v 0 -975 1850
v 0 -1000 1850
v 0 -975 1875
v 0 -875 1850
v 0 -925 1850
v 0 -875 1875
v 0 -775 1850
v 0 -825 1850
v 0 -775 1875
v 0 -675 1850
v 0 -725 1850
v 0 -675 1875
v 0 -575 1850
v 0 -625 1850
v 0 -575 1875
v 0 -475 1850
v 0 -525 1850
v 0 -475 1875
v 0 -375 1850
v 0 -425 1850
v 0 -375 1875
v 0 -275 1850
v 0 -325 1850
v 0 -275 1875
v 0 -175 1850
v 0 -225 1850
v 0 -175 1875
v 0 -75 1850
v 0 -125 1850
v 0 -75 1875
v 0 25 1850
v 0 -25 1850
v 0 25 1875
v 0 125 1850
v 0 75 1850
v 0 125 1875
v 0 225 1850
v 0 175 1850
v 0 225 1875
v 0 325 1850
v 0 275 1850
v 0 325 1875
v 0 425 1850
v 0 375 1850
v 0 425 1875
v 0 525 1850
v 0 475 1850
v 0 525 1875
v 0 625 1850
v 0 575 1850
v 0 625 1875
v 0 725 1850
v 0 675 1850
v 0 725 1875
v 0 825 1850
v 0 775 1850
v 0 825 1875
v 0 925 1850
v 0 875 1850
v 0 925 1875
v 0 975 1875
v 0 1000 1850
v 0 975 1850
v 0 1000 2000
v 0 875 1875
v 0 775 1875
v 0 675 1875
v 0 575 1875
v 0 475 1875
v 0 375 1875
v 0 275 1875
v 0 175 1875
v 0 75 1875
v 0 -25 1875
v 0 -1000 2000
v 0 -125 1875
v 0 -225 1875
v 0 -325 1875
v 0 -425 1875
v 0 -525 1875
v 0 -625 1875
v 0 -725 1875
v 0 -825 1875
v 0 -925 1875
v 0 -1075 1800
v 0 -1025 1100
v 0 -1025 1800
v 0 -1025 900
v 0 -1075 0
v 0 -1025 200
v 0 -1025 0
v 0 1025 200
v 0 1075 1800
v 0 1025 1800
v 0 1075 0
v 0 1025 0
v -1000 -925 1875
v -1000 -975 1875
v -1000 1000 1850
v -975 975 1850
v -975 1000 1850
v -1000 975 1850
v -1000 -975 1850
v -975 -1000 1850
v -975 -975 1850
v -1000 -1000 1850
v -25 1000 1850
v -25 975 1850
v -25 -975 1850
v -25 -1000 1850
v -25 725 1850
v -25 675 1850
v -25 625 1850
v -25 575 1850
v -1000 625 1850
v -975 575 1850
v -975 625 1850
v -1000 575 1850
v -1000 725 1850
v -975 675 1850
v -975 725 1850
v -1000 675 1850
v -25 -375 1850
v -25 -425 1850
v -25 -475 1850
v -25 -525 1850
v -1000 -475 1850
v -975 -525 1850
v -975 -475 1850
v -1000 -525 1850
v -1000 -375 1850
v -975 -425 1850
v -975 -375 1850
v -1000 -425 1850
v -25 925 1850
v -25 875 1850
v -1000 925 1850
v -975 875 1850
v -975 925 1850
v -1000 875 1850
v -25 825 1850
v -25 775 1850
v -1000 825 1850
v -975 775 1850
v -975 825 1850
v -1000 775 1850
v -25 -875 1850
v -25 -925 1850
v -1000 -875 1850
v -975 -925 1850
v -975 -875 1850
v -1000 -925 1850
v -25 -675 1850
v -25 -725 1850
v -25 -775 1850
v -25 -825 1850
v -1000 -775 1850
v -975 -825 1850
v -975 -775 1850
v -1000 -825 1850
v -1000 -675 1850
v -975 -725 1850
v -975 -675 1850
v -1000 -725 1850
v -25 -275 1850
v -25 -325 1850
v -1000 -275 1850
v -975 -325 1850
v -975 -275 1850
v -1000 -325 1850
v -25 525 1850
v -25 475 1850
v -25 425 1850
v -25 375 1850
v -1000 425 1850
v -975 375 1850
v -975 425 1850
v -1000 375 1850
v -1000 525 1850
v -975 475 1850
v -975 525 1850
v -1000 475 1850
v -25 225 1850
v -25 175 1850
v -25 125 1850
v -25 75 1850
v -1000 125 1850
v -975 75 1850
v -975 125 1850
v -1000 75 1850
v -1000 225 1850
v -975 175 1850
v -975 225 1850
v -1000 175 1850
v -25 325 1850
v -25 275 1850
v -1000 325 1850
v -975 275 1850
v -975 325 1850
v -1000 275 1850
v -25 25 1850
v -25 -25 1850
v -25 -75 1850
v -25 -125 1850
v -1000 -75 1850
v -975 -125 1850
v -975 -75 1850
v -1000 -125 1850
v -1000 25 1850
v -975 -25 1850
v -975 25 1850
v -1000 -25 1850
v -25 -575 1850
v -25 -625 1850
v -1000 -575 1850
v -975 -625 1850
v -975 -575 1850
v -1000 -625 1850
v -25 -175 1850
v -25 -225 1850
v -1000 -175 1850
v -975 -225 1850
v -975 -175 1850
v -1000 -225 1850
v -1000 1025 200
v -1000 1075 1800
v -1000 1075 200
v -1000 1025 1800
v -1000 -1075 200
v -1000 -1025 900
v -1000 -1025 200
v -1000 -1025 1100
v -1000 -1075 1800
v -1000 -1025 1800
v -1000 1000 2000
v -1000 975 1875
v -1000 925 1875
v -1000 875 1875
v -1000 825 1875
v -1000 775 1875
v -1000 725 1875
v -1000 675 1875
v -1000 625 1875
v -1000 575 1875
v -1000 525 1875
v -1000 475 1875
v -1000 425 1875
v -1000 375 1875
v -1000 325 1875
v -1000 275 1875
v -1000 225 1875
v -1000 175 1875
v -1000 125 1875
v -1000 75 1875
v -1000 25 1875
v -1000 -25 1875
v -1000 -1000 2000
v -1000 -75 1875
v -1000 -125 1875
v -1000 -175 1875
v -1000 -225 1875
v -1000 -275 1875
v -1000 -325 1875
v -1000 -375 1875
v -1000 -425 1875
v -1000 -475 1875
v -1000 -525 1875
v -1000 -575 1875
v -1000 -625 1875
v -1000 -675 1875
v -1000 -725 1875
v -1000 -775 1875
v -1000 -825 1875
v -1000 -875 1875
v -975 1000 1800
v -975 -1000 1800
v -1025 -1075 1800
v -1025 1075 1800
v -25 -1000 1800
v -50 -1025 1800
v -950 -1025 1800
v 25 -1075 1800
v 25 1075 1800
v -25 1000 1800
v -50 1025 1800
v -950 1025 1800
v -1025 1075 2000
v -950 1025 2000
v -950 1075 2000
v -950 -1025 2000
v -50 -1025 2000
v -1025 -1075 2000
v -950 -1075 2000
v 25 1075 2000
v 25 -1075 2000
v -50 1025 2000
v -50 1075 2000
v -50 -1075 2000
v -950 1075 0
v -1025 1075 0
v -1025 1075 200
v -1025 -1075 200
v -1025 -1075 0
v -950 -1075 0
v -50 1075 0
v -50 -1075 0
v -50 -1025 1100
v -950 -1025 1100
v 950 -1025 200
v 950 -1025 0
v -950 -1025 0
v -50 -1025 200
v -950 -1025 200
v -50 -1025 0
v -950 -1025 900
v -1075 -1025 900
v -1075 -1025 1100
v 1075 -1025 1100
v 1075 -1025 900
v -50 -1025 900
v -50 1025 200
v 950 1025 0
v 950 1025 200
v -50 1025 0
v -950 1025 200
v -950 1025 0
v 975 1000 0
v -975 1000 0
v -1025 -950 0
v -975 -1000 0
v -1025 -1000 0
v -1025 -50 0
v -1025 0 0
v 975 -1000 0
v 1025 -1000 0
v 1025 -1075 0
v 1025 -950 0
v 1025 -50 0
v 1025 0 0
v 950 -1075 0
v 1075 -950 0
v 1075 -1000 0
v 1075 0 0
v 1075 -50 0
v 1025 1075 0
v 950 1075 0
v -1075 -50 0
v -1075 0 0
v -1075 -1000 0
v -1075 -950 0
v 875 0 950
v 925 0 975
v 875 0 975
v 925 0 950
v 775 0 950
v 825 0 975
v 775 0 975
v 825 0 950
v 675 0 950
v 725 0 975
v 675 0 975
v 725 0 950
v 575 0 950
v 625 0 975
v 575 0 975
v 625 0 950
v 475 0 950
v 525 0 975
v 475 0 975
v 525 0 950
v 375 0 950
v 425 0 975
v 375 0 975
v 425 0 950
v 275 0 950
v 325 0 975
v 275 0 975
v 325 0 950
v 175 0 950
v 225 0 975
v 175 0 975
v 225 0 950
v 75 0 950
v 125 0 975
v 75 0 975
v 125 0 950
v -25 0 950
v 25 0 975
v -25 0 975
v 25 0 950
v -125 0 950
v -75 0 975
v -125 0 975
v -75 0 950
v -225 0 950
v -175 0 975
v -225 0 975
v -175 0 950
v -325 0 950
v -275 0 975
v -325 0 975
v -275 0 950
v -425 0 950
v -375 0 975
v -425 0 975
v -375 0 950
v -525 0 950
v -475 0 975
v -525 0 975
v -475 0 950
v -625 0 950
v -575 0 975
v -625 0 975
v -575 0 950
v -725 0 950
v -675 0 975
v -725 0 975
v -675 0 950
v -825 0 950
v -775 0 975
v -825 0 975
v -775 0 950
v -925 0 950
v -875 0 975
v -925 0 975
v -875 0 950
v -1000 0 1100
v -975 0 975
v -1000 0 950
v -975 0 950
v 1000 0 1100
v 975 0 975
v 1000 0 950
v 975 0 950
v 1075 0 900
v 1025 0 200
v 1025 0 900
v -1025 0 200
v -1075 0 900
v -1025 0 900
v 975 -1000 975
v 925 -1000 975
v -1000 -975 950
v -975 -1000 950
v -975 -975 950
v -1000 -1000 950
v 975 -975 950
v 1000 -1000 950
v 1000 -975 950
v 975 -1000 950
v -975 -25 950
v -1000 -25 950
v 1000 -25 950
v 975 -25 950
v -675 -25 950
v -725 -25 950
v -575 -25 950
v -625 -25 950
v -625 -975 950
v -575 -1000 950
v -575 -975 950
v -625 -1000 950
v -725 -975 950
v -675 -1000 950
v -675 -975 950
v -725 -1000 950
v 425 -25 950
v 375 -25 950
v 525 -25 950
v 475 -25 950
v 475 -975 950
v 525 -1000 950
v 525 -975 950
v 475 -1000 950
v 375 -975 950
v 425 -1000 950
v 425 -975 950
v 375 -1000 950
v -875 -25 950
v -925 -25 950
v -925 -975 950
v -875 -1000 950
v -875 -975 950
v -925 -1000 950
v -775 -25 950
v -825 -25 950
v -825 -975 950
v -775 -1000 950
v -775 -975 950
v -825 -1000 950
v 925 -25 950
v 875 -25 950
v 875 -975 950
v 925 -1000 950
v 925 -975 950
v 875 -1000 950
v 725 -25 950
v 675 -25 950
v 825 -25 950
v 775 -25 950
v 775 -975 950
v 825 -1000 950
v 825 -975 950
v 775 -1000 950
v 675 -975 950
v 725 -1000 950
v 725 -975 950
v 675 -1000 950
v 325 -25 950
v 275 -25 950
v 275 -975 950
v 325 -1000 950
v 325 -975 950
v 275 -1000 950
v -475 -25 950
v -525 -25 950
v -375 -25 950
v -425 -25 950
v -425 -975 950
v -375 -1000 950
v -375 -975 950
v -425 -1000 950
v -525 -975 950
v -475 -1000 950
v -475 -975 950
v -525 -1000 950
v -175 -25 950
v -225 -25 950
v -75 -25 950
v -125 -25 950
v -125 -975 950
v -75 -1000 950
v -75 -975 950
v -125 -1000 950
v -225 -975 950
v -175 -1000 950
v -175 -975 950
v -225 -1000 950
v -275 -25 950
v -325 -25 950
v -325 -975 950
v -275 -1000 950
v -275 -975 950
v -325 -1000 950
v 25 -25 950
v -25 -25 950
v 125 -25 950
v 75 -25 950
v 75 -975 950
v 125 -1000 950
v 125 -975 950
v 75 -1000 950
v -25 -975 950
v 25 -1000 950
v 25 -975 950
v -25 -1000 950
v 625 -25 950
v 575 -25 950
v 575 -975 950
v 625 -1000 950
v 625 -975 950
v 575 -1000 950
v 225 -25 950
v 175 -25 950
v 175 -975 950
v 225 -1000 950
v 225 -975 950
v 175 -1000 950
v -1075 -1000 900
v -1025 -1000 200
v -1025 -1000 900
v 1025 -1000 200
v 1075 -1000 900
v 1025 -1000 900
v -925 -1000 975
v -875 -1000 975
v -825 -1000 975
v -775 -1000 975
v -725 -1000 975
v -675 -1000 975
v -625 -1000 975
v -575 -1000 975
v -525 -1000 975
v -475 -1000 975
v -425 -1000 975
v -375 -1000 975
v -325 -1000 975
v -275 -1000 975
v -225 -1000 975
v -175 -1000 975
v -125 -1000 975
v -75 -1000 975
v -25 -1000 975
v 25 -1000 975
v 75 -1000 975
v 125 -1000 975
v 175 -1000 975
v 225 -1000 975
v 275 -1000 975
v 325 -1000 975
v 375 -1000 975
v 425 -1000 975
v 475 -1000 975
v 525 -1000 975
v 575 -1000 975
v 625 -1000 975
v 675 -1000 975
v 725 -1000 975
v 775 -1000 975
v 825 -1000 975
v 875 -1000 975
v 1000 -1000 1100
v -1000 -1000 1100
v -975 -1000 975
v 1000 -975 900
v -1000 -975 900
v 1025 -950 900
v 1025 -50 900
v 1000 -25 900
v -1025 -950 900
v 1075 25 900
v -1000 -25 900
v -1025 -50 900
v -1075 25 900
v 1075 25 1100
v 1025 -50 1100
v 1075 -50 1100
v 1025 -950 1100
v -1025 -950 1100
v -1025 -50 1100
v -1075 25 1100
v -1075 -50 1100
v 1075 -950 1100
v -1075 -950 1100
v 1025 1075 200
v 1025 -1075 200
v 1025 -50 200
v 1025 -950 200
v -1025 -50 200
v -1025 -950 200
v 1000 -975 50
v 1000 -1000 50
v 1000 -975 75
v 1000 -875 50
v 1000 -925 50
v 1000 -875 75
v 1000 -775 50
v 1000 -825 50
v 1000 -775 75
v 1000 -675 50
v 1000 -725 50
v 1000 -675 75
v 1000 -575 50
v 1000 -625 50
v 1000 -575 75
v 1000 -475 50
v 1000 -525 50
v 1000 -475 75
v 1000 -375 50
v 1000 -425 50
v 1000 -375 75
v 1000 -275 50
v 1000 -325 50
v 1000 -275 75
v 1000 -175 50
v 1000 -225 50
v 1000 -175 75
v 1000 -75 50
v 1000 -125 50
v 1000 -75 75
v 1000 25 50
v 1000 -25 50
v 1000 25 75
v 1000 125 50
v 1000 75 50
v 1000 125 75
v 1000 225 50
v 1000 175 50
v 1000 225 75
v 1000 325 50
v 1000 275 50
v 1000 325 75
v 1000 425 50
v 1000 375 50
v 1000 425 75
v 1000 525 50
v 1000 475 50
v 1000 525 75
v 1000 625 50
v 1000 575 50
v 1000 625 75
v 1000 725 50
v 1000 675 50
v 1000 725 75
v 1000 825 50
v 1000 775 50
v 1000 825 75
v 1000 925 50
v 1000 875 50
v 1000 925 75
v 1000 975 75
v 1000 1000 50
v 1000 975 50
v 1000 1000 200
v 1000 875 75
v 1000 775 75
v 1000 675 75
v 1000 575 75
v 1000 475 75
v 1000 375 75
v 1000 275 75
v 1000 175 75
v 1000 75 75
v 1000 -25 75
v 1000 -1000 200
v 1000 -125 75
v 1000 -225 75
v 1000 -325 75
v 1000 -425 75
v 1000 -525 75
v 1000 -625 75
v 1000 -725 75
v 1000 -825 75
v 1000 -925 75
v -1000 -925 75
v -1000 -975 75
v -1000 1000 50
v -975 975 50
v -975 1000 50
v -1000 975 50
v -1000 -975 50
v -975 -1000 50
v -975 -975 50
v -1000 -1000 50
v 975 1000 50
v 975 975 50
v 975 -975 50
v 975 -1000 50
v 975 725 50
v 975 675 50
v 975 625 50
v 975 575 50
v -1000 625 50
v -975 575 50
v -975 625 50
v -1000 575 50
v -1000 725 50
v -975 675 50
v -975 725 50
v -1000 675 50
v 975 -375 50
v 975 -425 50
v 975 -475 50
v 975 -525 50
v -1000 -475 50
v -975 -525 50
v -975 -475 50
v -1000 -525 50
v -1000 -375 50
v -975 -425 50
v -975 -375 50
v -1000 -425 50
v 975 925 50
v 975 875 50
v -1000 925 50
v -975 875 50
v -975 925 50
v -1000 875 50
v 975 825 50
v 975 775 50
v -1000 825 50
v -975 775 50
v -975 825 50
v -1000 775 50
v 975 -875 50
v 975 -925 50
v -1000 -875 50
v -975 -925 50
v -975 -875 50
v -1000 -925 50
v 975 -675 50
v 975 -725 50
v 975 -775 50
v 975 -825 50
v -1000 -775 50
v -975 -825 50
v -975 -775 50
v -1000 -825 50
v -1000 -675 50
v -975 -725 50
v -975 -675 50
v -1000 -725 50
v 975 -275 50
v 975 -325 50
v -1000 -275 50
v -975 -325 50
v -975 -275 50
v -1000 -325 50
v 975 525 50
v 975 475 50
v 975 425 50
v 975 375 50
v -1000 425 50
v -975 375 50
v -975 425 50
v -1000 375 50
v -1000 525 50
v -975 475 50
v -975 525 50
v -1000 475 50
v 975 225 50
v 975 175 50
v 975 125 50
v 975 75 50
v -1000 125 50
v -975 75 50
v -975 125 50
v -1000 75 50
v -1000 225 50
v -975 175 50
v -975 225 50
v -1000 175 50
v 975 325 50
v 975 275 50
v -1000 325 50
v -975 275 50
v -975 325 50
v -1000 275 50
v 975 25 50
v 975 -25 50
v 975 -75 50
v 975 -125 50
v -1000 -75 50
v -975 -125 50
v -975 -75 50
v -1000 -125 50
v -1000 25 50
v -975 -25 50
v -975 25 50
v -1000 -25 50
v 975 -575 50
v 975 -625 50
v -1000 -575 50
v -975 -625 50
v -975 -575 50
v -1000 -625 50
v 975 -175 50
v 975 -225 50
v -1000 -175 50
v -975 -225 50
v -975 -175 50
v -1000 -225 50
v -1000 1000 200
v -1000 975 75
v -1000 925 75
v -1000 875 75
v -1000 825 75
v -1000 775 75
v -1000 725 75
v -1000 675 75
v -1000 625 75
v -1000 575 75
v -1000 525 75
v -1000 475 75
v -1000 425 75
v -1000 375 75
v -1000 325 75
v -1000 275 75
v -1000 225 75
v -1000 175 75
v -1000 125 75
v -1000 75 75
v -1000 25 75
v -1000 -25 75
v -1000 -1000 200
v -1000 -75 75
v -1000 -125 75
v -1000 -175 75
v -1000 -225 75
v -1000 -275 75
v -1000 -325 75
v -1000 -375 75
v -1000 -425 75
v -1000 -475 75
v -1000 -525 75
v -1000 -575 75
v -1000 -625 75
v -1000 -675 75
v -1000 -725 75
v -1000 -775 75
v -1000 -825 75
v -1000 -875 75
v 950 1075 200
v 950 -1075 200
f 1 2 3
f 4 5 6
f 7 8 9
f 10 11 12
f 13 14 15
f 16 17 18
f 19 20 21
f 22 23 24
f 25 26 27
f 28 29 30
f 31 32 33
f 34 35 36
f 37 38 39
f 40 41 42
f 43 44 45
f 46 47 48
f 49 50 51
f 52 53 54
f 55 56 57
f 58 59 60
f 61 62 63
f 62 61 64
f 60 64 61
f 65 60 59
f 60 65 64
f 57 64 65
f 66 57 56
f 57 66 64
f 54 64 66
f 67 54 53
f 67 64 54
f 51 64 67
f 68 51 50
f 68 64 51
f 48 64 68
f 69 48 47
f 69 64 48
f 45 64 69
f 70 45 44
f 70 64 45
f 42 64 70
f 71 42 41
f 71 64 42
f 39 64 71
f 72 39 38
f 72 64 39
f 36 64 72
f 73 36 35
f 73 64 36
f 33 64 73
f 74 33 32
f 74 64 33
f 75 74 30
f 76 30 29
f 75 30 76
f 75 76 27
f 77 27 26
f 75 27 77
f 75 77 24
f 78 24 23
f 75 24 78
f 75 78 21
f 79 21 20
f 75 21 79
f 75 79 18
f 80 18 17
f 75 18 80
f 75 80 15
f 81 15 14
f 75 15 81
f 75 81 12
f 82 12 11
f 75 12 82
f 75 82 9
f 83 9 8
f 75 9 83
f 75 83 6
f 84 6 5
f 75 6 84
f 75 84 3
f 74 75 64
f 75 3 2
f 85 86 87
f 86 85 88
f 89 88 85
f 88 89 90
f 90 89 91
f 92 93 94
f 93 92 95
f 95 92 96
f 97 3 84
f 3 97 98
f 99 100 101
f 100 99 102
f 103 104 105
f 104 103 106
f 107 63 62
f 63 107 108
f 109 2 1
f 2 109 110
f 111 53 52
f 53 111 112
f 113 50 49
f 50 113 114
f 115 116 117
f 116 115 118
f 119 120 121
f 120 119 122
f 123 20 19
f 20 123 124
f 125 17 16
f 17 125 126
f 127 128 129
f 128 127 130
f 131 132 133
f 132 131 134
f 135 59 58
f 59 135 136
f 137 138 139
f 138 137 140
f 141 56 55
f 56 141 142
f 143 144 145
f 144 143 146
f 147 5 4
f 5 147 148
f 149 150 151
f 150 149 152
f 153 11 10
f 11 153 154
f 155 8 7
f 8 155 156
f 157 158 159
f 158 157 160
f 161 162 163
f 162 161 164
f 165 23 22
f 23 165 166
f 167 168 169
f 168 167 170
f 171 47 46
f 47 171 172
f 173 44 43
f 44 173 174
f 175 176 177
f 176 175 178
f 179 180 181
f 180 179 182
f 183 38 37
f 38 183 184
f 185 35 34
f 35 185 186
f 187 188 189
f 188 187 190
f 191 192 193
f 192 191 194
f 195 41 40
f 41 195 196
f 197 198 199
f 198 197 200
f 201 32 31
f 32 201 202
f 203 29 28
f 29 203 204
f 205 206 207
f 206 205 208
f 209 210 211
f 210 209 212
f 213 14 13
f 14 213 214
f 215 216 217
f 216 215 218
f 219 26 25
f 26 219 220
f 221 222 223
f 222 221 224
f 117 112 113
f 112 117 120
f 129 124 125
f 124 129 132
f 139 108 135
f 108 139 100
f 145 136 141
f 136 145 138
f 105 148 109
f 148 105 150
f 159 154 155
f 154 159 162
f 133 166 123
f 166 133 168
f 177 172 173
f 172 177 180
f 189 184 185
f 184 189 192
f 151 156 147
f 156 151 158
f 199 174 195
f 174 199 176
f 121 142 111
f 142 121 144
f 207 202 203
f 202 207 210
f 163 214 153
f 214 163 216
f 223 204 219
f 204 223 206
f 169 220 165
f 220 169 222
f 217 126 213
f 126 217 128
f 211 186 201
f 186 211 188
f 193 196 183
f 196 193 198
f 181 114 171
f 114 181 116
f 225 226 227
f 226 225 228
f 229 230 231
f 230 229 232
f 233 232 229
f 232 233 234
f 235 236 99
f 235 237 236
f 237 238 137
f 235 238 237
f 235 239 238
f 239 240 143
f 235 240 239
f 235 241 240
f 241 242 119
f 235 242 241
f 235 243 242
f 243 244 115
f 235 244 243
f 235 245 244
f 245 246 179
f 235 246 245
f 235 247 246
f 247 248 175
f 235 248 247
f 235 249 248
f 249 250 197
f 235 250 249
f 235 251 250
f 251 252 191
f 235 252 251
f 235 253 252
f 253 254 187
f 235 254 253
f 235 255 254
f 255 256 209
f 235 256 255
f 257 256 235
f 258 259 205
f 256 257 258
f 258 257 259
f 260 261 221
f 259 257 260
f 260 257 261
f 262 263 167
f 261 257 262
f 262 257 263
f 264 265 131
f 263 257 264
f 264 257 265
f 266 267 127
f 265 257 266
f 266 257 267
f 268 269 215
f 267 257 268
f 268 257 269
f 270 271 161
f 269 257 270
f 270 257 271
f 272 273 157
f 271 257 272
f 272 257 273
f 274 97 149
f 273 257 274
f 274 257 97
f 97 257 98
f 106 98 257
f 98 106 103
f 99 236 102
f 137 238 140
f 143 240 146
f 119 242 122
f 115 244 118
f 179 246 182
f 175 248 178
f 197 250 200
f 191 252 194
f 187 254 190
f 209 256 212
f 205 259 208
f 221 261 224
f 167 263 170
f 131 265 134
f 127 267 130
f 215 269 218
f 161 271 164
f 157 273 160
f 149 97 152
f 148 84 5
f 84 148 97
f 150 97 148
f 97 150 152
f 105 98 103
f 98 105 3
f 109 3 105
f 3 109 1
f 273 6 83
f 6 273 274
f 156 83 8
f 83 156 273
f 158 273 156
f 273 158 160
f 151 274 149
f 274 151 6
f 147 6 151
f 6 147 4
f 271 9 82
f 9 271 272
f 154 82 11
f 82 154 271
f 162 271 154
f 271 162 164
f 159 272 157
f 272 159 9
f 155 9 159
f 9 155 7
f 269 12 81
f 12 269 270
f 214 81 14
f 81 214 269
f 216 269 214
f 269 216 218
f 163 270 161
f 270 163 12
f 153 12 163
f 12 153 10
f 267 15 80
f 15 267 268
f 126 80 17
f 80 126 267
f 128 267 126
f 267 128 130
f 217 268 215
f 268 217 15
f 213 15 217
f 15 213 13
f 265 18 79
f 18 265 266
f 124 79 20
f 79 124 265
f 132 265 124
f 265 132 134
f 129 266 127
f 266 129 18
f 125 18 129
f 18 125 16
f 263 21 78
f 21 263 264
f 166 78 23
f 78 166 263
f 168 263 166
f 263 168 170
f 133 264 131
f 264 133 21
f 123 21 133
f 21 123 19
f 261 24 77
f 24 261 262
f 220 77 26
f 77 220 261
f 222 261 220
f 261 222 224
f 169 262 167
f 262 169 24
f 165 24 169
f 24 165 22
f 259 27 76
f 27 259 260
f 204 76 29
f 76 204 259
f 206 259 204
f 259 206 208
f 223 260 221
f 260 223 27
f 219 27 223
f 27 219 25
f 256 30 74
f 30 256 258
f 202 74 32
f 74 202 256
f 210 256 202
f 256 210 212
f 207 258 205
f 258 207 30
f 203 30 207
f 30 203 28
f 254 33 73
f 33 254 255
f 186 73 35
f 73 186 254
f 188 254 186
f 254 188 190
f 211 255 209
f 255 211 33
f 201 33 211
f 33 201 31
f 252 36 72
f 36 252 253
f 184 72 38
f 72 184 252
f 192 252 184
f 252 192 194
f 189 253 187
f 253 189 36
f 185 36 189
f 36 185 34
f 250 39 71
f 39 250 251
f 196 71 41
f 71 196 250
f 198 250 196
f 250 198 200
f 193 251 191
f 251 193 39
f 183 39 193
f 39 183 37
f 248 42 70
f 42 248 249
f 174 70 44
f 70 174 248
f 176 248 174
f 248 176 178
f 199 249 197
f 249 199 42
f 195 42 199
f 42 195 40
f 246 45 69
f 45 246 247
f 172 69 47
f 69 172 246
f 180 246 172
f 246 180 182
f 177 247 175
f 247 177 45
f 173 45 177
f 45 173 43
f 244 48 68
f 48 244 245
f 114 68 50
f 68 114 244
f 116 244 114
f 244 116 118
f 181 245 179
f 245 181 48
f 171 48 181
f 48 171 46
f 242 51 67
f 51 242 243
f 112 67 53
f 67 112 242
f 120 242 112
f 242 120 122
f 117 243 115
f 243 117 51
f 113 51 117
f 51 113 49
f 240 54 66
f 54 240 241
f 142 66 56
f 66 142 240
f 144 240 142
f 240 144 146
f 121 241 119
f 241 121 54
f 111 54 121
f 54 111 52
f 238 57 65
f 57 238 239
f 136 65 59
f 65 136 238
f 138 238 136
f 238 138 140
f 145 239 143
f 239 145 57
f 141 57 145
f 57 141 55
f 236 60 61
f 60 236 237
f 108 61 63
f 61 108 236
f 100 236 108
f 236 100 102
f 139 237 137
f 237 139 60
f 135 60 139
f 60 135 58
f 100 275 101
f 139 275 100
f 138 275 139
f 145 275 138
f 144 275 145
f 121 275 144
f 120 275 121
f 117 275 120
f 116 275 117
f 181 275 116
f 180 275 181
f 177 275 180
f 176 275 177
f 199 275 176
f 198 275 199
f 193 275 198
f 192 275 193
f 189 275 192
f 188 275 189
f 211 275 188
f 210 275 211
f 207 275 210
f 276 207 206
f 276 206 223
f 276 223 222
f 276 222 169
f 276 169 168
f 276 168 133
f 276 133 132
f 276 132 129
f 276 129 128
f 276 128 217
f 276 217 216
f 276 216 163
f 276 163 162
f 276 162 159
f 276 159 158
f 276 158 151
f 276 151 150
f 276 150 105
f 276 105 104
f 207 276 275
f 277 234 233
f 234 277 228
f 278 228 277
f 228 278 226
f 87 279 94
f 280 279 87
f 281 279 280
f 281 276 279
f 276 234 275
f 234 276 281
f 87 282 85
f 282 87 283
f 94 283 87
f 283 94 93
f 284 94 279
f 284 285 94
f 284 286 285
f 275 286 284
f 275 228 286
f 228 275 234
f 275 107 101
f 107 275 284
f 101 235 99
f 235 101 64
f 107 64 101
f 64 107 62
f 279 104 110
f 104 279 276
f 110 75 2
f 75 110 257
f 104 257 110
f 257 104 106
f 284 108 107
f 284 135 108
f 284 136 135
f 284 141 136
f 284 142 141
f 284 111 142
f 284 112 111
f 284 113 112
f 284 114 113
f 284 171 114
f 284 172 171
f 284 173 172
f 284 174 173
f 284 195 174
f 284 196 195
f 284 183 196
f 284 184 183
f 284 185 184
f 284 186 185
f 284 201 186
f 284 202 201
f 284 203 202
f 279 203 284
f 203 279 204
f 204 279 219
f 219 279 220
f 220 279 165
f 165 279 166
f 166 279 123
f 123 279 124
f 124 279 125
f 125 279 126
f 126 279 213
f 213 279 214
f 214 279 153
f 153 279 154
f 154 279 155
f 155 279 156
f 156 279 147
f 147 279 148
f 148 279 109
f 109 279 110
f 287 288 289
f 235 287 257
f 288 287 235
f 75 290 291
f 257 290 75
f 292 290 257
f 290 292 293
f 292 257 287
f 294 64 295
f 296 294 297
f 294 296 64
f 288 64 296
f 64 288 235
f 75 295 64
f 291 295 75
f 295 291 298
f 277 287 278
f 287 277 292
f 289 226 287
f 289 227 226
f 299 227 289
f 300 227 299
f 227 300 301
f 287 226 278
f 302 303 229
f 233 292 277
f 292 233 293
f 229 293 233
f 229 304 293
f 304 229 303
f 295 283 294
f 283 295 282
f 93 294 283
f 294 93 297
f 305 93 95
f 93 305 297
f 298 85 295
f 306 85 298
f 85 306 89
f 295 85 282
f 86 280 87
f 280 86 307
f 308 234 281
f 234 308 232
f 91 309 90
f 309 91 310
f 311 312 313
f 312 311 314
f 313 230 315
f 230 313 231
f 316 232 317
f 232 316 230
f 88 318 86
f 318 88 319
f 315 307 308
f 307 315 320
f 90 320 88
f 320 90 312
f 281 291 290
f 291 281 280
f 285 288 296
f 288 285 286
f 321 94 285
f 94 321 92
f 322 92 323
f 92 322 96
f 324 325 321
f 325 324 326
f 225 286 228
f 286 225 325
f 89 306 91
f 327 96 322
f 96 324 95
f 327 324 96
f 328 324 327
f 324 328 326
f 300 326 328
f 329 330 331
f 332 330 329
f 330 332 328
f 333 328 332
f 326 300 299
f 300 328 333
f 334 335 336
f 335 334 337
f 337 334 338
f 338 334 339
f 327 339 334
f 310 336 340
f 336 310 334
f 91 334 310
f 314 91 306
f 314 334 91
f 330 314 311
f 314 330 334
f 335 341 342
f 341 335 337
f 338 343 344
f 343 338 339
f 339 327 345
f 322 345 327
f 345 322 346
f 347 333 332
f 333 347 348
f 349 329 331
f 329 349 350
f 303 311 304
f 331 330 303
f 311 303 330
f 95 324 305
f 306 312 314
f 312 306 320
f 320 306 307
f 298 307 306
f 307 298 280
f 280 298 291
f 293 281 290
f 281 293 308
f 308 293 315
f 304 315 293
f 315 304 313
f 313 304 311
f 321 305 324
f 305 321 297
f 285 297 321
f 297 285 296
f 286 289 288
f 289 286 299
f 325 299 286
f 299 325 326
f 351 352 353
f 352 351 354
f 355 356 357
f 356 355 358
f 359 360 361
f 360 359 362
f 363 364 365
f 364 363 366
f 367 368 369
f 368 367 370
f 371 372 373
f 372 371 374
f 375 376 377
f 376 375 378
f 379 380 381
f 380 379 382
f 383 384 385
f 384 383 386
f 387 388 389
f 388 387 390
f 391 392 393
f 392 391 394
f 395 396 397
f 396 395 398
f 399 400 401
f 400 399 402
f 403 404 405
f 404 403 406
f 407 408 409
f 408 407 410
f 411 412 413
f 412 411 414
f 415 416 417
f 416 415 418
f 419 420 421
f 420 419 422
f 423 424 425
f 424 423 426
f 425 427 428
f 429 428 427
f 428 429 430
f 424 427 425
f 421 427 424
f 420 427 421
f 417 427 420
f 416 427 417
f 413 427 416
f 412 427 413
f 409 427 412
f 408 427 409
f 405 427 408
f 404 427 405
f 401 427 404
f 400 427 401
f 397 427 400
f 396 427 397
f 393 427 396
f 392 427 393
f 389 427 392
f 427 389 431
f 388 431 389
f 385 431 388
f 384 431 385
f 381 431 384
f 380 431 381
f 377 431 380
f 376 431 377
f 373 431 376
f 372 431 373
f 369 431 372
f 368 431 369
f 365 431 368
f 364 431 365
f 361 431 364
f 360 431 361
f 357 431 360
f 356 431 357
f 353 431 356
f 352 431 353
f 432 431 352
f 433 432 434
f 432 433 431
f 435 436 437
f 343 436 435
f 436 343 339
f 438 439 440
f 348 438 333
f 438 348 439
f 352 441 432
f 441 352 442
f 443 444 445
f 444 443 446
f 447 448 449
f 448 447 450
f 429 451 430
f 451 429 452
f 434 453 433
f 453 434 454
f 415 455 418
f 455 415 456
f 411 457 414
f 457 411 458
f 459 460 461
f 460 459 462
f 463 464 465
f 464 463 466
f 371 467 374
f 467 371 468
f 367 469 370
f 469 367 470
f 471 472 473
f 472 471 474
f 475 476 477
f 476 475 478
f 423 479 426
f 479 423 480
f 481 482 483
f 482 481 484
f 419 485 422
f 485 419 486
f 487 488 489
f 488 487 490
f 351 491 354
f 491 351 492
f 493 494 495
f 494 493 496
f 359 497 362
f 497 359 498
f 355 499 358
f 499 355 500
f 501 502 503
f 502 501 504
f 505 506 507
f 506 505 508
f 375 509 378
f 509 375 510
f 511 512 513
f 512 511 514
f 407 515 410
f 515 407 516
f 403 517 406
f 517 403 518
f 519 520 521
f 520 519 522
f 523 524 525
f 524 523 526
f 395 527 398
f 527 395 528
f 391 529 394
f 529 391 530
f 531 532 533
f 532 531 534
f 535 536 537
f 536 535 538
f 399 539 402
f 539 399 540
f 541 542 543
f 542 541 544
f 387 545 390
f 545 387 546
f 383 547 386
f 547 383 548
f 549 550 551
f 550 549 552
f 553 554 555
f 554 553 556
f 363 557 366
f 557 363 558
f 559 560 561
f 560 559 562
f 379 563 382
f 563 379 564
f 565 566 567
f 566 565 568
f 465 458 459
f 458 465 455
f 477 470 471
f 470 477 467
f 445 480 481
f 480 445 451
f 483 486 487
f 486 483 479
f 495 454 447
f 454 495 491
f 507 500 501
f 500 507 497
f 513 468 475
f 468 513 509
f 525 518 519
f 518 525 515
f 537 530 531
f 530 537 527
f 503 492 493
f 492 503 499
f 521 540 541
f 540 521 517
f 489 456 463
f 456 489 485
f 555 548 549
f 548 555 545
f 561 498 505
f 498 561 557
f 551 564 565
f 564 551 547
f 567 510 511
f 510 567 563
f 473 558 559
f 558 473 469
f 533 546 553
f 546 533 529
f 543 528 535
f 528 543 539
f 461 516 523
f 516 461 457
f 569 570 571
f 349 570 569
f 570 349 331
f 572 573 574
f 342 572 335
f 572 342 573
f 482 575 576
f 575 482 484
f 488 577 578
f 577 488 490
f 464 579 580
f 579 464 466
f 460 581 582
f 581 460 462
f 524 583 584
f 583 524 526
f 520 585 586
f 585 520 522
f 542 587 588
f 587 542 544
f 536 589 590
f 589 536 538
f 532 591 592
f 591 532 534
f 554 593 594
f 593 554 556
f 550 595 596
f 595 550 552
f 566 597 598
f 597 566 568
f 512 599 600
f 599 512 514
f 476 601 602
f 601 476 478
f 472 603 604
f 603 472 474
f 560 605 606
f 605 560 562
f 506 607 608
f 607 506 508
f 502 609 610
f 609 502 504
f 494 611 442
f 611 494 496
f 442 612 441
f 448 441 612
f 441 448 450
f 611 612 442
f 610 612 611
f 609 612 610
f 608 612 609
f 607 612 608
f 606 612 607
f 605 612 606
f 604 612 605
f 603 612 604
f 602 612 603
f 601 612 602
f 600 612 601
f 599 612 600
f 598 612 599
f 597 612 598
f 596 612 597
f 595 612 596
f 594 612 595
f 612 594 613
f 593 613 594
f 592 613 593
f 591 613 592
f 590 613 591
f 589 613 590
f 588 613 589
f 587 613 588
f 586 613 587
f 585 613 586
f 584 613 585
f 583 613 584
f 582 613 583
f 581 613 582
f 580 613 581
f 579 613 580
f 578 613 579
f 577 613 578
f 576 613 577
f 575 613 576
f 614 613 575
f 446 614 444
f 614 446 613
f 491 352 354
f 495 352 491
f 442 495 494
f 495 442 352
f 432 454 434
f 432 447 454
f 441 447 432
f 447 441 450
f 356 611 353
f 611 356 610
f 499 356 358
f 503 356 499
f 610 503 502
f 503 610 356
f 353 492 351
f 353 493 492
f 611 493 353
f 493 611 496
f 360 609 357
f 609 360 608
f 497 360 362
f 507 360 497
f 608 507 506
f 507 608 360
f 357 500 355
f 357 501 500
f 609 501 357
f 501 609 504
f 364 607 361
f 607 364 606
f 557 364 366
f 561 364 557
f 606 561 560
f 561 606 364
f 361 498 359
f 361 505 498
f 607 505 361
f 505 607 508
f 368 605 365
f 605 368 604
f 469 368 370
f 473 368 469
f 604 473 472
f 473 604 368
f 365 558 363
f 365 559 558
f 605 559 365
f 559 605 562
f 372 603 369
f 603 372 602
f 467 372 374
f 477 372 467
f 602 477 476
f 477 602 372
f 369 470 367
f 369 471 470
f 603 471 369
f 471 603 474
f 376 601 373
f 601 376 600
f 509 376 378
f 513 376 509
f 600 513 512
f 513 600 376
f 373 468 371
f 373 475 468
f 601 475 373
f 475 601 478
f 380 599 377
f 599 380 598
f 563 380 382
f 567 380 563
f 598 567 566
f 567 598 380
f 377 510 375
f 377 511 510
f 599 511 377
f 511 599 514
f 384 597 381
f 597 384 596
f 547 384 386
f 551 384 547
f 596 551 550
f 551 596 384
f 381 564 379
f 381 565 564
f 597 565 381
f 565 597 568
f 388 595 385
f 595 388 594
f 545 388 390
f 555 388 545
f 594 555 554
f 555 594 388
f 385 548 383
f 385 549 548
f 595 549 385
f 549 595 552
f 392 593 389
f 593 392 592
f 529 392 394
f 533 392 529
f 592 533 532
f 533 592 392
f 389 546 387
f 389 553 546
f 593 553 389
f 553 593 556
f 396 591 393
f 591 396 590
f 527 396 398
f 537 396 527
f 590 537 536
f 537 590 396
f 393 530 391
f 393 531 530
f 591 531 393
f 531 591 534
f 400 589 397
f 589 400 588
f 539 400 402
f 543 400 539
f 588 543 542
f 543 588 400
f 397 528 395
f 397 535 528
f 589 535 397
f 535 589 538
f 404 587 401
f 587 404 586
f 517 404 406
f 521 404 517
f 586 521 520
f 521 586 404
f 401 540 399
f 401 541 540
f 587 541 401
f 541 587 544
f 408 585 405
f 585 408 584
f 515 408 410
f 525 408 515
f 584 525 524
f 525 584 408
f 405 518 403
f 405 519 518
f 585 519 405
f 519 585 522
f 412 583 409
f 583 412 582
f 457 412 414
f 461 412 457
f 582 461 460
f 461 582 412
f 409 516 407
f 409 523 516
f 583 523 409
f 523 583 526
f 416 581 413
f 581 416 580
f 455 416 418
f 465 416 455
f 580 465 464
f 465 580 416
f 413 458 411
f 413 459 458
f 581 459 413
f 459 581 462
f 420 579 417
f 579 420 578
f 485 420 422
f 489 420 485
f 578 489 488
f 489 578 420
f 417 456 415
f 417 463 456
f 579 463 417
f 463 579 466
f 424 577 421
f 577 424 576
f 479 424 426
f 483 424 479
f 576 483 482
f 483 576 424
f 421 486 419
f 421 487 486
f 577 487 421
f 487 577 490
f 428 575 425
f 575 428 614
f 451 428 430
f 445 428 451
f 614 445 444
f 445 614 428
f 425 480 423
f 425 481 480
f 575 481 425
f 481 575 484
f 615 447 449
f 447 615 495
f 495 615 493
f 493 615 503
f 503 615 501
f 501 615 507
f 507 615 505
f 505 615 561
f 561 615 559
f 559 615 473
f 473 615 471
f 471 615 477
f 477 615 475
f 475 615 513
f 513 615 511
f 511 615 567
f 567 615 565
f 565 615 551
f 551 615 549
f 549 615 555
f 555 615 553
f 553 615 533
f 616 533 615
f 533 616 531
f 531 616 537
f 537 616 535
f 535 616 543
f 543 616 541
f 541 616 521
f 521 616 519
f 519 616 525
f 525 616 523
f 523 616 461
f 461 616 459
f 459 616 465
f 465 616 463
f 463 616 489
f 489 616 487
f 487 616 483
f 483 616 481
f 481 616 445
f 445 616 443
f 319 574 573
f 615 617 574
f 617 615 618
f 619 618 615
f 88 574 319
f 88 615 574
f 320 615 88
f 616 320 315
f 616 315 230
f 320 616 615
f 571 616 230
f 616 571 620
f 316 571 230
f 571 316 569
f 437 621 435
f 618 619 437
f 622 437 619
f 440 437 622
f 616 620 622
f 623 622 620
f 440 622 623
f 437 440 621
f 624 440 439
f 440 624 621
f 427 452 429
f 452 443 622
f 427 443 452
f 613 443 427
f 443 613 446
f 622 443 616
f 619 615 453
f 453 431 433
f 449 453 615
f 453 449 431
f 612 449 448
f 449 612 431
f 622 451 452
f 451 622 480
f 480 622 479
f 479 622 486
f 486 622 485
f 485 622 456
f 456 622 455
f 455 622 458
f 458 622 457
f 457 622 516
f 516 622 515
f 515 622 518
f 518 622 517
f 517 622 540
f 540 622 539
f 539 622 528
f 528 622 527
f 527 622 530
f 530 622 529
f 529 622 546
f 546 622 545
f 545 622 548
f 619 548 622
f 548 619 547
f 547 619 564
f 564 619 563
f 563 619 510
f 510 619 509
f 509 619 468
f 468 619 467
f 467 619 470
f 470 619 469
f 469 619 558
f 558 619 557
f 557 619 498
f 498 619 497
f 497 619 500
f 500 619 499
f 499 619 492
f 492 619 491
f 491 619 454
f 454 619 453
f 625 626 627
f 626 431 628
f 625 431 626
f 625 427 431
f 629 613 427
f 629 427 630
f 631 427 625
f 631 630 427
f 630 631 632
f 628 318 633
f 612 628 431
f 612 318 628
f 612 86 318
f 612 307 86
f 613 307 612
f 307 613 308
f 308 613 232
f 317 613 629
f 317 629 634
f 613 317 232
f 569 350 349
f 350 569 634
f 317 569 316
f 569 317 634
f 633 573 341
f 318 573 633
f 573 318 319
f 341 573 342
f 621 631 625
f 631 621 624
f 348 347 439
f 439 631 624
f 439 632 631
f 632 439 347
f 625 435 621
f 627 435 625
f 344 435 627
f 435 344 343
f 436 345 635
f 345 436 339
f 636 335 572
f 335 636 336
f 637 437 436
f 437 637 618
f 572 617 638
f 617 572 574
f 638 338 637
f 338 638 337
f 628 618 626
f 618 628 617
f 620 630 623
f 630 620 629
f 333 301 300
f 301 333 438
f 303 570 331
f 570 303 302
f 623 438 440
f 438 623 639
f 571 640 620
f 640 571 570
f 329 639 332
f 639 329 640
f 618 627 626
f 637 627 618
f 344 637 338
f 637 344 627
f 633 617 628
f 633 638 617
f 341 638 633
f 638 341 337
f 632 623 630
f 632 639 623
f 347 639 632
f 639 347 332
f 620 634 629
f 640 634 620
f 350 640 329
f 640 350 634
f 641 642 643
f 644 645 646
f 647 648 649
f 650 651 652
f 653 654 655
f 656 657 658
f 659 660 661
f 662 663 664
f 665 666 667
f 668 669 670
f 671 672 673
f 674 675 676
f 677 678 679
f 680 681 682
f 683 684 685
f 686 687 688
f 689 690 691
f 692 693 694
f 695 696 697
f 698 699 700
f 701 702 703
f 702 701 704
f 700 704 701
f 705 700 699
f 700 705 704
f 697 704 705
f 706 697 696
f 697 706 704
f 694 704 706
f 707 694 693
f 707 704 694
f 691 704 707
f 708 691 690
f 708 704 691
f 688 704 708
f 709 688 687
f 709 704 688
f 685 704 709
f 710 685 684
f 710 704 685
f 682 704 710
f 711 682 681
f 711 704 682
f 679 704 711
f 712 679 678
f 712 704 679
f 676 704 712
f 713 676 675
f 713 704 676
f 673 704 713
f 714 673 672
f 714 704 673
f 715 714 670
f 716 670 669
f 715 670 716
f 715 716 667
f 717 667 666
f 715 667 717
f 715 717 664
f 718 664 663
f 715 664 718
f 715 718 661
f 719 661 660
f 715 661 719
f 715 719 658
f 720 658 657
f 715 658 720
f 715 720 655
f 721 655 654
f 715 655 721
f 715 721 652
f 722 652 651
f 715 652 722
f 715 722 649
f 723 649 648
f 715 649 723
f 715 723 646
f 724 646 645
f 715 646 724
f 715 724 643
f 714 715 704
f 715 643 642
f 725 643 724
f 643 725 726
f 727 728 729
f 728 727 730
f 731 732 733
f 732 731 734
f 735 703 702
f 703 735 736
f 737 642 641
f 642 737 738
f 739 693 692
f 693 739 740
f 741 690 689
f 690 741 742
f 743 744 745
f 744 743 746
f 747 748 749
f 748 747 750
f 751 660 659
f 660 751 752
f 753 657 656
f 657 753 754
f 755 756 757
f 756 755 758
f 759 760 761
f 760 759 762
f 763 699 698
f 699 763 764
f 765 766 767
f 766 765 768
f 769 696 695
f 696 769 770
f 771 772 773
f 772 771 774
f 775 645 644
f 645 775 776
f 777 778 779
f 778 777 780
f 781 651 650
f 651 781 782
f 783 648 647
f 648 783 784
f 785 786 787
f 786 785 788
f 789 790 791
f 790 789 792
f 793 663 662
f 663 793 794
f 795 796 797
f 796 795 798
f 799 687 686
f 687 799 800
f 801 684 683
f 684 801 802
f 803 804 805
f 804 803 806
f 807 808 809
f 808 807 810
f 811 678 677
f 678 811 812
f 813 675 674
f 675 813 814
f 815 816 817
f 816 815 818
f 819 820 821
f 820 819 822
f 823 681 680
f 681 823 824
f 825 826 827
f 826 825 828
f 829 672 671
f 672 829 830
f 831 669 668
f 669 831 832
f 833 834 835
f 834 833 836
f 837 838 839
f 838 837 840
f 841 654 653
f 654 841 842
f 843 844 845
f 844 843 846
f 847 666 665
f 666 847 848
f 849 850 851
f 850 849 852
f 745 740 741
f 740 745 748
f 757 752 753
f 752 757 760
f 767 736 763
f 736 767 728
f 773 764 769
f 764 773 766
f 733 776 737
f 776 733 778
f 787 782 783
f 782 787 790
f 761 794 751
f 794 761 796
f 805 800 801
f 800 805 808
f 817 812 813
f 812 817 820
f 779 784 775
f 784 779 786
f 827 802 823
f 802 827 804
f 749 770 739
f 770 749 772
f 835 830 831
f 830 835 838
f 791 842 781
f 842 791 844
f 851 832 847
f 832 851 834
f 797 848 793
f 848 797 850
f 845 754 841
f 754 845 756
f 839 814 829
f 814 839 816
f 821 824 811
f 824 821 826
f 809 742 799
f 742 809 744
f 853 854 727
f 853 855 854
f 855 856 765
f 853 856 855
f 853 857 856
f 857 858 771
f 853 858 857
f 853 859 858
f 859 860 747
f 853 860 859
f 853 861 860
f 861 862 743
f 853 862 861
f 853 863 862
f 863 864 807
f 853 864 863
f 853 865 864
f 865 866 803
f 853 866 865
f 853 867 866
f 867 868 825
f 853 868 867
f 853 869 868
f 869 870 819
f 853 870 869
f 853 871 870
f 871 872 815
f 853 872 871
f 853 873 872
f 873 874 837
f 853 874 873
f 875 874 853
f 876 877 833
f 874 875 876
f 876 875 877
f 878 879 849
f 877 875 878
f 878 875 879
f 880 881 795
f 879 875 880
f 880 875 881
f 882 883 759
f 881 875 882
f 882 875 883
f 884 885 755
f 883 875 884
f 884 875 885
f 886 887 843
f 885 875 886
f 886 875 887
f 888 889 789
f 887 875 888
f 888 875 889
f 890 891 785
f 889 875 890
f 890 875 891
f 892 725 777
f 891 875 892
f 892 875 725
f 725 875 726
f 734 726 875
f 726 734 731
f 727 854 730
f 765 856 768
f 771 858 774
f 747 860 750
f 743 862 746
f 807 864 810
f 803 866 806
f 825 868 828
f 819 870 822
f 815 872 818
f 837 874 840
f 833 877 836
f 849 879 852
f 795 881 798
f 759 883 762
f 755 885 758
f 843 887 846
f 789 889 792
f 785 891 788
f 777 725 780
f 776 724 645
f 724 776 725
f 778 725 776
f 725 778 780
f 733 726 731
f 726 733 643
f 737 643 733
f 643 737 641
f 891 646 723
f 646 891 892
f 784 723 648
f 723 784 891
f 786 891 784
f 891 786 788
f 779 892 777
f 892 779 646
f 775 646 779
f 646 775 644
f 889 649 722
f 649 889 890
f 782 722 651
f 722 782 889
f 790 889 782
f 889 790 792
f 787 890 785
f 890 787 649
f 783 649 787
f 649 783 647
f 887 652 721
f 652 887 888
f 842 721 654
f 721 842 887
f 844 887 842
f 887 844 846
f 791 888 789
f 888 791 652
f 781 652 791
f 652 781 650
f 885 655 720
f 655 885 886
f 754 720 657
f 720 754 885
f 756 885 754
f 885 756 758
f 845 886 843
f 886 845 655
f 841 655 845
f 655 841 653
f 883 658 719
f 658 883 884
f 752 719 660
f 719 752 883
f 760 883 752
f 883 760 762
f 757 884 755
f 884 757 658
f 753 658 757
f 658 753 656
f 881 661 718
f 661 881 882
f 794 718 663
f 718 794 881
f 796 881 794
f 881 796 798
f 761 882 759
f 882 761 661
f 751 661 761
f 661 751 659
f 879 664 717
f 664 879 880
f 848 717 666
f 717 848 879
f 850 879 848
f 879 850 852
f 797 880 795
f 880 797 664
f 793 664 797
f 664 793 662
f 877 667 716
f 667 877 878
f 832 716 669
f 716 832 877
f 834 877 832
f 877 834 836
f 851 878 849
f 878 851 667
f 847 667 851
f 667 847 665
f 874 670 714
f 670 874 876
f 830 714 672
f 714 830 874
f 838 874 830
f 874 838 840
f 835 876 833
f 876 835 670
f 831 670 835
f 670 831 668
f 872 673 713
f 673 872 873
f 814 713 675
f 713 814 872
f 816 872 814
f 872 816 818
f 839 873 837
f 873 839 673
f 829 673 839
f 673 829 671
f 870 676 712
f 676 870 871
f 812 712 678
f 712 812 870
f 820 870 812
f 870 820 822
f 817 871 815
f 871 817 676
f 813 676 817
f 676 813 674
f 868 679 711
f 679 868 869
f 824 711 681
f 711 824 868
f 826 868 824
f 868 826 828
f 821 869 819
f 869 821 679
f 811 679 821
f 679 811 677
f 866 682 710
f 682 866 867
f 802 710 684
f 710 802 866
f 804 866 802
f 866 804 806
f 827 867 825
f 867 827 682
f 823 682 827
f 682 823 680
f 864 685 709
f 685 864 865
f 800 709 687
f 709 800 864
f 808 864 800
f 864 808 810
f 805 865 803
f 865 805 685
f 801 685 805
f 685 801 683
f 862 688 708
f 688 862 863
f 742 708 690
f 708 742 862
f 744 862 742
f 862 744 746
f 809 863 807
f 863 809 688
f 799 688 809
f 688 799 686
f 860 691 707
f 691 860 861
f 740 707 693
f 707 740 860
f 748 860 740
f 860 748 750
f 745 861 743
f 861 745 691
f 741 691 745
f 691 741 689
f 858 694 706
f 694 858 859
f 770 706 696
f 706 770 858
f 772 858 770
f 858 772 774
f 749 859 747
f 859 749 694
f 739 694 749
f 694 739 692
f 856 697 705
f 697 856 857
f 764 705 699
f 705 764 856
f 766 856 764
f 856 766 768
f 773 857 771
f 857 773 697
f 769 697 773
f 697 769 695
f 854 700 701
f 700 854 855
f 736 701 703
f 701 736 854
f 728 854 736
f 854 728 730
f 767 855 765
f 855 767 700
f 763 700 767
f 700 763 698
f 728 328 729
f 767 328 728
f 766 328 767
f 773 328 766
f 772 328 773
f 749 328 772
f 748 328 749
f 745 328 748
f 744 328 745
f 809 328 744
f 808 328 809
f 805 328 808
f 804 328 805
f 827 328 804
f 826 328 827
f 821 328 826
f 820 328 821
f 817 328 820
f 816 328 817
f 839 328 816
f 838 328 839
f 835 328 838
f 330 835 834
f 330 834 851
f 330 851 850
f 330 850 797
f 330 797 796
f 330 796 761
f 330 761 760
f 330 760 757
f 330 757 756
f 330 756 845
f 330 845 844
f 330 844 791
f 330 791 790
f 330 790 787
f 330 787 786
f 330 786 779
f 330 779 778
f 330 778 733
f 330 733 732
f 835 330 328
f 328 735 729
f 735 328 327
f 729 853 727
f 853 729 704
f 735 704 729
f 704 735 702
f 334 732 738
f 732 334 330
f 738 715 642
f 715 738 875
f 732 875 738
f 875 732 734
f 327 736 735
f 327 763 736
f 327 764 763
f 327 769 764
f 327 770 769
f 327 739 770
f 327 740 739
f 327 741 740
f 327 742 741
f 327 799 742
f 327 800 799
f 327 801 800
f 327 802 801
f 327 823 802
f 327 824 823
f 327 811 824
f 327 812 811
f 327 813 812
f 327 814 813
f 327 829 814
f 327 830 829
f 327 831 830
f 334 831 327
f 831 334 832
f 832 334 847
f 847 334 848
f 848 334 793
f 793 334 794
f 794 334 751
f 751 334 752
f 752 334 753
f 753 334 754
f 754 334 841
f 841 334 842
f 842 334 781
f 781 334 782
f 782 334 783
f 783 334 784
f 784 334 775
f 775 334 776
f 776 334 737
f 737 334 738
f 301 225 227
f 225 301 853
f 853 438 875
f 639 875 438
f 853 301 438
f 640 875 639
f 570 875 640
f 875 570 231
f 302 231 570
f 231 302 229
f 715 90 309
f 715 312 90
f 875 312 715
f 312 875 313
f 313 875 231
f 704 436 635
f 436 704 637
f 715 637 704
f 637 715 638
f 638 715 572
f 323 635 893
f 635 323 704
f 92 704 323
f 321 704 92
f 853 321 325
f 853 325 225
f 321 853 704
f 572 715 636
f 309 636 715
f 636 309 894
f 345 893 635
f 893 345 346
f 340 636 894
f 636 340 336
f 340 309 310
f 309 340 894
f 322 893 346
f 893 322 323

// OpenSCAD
// file: bolts.scad
$radial_error = 0.1;
$fn = 4*8;

module cylinder_outer(height, radius, fn=$fn, radial_error=$radial_error) {
	fudge = 1/cos(180/fn);
	cylinder(h=height,r=radius*fudge+$radial_error, $fn=fn);
}

module cylinder_inner(height, radius, fn=$fn) {
	cylinder(h=height,r=radius-$radial_error,$fn=fn);
}

// Make a hole. The diameter is the size of the screw (e.g. 3 for M3). Depth is how far the hole should go for the thread, and inset is how far out there should be a hole for the head to go.
module hole(diameter=3, depth=6, inset=10) {
	cylinder_outer(depth, diameter/2);
	translate([0, 0, depth]) cylinder_outer(inset, diameter, 32);
}

module countersunk_hole(diameter=3, depth=6, inset=10) {
	hole(diameter, depth, inset);
	translate([0, 0, depth-diameter/2]) cylinder(r1=diameter/2+$radial_error, r2=diameter+$radial_error, h=diameter/2);
}

module threaded_countersunk_hole(diameter=3, depth=6, inset=10) {
	hole(diameter*0.9, depth, inset);
	translate([0, 0, depth-diameter/2]) cylinder(r1=diameter/2+$radial_error, r2=diameter+$radial_error, h=diameter/2);
}

module knurled_insert(diameter = 3, depth = 6, thickness = 1) {
	cylinder_inner(depth, diameter/2 + thickness);
}

module knurled_hole(diameter = 3, depth = 6, inset = 10, insert = 4, thickness = 1) {
	hole(diameter, depth, inset);
	
	knurled_insert(diameter, insert, thickness);
}

module countersunk_knurled_hole(diameter = 3, depth = 6, inset = 10, insert = 4, thickness = 1) {
	countersunk_hole(diameter, depth, inset);
	
	knurled_insert(diameter, insert, thickness);
}

// Make a hole for a bolt/screw combination.
module bolted_hole(diameter=3, depth=8, nut_offset=2, shaft_length=10, inset=10) {
	hole(diameter, depth, inset);
	hull() {
		shaft_width = diameter;
		translate([0, 0, nut_offset]) rotate(360/12, [0, 0, 1]) cylinder_outer(diameter, shaft_width, 6);
		translate([0, shaft_length, nut_offset]) rotate(360/12, [0, 0, 1]) cylinder_outer(diameter, shaft_width, 6);
	}
}

module countersunk_bolted_hole(diameter=3, depth=8, nut_offset=2, shaft_length=10, inset=10) {
	countersunk_hole(diameter, depth, inset);
	hull() {
		shaft_width = diameter;
		translate([0, 0, nut_offset]) rotate(360/12, [0, 0, 1]) cylinder_outer(diameter, shaft_width, 6);
		translate([0, shaft_length, nut_offset]) rotate(360/12, [0, 0, 1]) cylinder_outer(diameter, shaft_width, 6);
	}
}

module mounting_hole(diameter=3, depth=6, inset=10, outset=3) {
	difference() {
		cylinder_outer(depth, diameter/2+outset);
		hole(diameter=diameter, depth=depth, inset=inset);
	}
}

render() rotate(90, [1, 0, 0]) difference() {
	cube([40, 10, 10]);
	translate([5, 5, 0]) bolted_hole(diameter=3, depth=8);
	translate([15, 5, 0]) bolted_hole(diameter=4, depth=8);
	translate([25, 5, 0]) countersunk_hole(diameter=4, depth=8);
	translate([35, 5, 0]) knurled_hole();
}
// file: zcube.scad
// This function creates a cube with a given x/y either above (f=1) or below (f=-1) the z axis.
module zcube(dimensions, z=0, f=1, x=0, y=0, bom=false) {
	if (bom) {
		echo(bom, dimensions);
	}
	
	translate([x*dimensions[0]/2, y*dimensions[1]/2, dimensions[2]/2 * f + z]) cube(dimensions, true);
}

module zring(dimensions, thickness, z=0, f=1) {
	render() difference() {
		zcube([dimensions[0]+thickness/2, dimensions[1]+thickness/2, dimensions[2]], z=z, f=f);
		zcube([dimensions[0]-thickness/2, dimensions[1]-thickness/2, dimensions[2]], z=z, f=f);
	}
}

module rcube(dimensions, d, z=0, f=1) {
	dx = dimensions[0]/2 - d/2;
	dy = dimensions[1]/2 - d/2;
	dz = dimensions[2]/2 * (f-1) + z;
	
	hull() {
		translate([-dx, -dy, dz]) cylinder(h=dimensions[2], d=d);
		translate([-dx, dy, dz]) cylinder(h=dimensions[2], d=d);
		translate([dx, -dy, dz]) cylinder(h=dimensions[2], d=d);
		translate([dx, dy, dz]) cylinder(h=dimensions[2], d=d);
	}
}

module zcorners() {
	children();
	mirror([1, 0, 0]) children();
	
	mirror([0, 1, 0]) {
		children();
		mirror([1, 0, 0]) children();
	}
}
// main file
use <zcube.scad>;
use <bolts.scad>;

vertical_space = 700;
side_thickness = 25;
side_height = 200;

module bed(width = 1000, length = 2000, height=2000, mattress_thickness=100) {
	extension = (side_thickness + 50) * 2;
	
	//futon
	//translate([0, 0, height-side_height+75]) color("black") zcube([width, length, mattress_thickness]);
	
	color("brown") {
		translate([-width/2, 0, height-side_height]) zcube([side_thickness, length, 50], x=1, bom="slat rails");
		translate([width/2, 0, height-side_height]) zcube([side_thickness, length, 50], x=-1, bom="slat rails");
	
		for (i = [-length/2+50:100:length/2-50]) {
			translate([0, i, height-side_height+50]) zcube([width, 50, 25], bom="slat");
		}
	}
	
	color("red") {
		translate([-width/2, 0, height-side_height]) zcube([side_thickness, length+extension, side_height], x=-1, bom="sides");
		translate([width/2, 0, height-side_height]) zcube([side_thickness, length+extension, side_height], x=1, bom="sides");
		translate([0, -length/2, height-side_height]) zcube([width, side_thickness, side_height], y=-1, bom="sides");
		translate([0, length/2, height-side_height]) zcube([width, side_thickness, side_height], y=1, bom="sides");
	}
	
	color("orange") {
		zcorners() {
			translate([width/2-side_thickness*2, length/2+side_thickness, 0]) zcube([50, 50, height], x=1, y=1, bom="posts");
		}
	}
}

rotate([0, 0, 0]) {
	translate([-500, 0, 0]) bed(height=side_height*3+vertical_space*2);
	rotate([0, 0, 90]) translate([-500, 0, 0]) bed(height=side_height*2+vertical_space);
	bed(width=2000, height=1000, height=side_height, mattress_thickness=150);
}

// house
module house(width = 2400, depth = 2400, height = 2100) {
	translate([-depth/2, 0, 0]) color("grey") zcube([1, width, height]);
	translate([-depth/2, 0, height]) color("grey") rotate([0, 45, 0]) zcube([1, width, 1000]);
	
	translate([-depth/2, -width/2, 0]) color("grey") zcube([depth, 1, height]);
	translate([-depth/2, -width/2, height]) color("grey") rotate([-45, 0, 0]) zcube([depth, 1, 1000]);
	
	translate([0, width/2, 0]) color("grey") zcube([depth, 1, height+710]);
	
	color("grey") zcube([depth, width, 1]);
};

//house();
